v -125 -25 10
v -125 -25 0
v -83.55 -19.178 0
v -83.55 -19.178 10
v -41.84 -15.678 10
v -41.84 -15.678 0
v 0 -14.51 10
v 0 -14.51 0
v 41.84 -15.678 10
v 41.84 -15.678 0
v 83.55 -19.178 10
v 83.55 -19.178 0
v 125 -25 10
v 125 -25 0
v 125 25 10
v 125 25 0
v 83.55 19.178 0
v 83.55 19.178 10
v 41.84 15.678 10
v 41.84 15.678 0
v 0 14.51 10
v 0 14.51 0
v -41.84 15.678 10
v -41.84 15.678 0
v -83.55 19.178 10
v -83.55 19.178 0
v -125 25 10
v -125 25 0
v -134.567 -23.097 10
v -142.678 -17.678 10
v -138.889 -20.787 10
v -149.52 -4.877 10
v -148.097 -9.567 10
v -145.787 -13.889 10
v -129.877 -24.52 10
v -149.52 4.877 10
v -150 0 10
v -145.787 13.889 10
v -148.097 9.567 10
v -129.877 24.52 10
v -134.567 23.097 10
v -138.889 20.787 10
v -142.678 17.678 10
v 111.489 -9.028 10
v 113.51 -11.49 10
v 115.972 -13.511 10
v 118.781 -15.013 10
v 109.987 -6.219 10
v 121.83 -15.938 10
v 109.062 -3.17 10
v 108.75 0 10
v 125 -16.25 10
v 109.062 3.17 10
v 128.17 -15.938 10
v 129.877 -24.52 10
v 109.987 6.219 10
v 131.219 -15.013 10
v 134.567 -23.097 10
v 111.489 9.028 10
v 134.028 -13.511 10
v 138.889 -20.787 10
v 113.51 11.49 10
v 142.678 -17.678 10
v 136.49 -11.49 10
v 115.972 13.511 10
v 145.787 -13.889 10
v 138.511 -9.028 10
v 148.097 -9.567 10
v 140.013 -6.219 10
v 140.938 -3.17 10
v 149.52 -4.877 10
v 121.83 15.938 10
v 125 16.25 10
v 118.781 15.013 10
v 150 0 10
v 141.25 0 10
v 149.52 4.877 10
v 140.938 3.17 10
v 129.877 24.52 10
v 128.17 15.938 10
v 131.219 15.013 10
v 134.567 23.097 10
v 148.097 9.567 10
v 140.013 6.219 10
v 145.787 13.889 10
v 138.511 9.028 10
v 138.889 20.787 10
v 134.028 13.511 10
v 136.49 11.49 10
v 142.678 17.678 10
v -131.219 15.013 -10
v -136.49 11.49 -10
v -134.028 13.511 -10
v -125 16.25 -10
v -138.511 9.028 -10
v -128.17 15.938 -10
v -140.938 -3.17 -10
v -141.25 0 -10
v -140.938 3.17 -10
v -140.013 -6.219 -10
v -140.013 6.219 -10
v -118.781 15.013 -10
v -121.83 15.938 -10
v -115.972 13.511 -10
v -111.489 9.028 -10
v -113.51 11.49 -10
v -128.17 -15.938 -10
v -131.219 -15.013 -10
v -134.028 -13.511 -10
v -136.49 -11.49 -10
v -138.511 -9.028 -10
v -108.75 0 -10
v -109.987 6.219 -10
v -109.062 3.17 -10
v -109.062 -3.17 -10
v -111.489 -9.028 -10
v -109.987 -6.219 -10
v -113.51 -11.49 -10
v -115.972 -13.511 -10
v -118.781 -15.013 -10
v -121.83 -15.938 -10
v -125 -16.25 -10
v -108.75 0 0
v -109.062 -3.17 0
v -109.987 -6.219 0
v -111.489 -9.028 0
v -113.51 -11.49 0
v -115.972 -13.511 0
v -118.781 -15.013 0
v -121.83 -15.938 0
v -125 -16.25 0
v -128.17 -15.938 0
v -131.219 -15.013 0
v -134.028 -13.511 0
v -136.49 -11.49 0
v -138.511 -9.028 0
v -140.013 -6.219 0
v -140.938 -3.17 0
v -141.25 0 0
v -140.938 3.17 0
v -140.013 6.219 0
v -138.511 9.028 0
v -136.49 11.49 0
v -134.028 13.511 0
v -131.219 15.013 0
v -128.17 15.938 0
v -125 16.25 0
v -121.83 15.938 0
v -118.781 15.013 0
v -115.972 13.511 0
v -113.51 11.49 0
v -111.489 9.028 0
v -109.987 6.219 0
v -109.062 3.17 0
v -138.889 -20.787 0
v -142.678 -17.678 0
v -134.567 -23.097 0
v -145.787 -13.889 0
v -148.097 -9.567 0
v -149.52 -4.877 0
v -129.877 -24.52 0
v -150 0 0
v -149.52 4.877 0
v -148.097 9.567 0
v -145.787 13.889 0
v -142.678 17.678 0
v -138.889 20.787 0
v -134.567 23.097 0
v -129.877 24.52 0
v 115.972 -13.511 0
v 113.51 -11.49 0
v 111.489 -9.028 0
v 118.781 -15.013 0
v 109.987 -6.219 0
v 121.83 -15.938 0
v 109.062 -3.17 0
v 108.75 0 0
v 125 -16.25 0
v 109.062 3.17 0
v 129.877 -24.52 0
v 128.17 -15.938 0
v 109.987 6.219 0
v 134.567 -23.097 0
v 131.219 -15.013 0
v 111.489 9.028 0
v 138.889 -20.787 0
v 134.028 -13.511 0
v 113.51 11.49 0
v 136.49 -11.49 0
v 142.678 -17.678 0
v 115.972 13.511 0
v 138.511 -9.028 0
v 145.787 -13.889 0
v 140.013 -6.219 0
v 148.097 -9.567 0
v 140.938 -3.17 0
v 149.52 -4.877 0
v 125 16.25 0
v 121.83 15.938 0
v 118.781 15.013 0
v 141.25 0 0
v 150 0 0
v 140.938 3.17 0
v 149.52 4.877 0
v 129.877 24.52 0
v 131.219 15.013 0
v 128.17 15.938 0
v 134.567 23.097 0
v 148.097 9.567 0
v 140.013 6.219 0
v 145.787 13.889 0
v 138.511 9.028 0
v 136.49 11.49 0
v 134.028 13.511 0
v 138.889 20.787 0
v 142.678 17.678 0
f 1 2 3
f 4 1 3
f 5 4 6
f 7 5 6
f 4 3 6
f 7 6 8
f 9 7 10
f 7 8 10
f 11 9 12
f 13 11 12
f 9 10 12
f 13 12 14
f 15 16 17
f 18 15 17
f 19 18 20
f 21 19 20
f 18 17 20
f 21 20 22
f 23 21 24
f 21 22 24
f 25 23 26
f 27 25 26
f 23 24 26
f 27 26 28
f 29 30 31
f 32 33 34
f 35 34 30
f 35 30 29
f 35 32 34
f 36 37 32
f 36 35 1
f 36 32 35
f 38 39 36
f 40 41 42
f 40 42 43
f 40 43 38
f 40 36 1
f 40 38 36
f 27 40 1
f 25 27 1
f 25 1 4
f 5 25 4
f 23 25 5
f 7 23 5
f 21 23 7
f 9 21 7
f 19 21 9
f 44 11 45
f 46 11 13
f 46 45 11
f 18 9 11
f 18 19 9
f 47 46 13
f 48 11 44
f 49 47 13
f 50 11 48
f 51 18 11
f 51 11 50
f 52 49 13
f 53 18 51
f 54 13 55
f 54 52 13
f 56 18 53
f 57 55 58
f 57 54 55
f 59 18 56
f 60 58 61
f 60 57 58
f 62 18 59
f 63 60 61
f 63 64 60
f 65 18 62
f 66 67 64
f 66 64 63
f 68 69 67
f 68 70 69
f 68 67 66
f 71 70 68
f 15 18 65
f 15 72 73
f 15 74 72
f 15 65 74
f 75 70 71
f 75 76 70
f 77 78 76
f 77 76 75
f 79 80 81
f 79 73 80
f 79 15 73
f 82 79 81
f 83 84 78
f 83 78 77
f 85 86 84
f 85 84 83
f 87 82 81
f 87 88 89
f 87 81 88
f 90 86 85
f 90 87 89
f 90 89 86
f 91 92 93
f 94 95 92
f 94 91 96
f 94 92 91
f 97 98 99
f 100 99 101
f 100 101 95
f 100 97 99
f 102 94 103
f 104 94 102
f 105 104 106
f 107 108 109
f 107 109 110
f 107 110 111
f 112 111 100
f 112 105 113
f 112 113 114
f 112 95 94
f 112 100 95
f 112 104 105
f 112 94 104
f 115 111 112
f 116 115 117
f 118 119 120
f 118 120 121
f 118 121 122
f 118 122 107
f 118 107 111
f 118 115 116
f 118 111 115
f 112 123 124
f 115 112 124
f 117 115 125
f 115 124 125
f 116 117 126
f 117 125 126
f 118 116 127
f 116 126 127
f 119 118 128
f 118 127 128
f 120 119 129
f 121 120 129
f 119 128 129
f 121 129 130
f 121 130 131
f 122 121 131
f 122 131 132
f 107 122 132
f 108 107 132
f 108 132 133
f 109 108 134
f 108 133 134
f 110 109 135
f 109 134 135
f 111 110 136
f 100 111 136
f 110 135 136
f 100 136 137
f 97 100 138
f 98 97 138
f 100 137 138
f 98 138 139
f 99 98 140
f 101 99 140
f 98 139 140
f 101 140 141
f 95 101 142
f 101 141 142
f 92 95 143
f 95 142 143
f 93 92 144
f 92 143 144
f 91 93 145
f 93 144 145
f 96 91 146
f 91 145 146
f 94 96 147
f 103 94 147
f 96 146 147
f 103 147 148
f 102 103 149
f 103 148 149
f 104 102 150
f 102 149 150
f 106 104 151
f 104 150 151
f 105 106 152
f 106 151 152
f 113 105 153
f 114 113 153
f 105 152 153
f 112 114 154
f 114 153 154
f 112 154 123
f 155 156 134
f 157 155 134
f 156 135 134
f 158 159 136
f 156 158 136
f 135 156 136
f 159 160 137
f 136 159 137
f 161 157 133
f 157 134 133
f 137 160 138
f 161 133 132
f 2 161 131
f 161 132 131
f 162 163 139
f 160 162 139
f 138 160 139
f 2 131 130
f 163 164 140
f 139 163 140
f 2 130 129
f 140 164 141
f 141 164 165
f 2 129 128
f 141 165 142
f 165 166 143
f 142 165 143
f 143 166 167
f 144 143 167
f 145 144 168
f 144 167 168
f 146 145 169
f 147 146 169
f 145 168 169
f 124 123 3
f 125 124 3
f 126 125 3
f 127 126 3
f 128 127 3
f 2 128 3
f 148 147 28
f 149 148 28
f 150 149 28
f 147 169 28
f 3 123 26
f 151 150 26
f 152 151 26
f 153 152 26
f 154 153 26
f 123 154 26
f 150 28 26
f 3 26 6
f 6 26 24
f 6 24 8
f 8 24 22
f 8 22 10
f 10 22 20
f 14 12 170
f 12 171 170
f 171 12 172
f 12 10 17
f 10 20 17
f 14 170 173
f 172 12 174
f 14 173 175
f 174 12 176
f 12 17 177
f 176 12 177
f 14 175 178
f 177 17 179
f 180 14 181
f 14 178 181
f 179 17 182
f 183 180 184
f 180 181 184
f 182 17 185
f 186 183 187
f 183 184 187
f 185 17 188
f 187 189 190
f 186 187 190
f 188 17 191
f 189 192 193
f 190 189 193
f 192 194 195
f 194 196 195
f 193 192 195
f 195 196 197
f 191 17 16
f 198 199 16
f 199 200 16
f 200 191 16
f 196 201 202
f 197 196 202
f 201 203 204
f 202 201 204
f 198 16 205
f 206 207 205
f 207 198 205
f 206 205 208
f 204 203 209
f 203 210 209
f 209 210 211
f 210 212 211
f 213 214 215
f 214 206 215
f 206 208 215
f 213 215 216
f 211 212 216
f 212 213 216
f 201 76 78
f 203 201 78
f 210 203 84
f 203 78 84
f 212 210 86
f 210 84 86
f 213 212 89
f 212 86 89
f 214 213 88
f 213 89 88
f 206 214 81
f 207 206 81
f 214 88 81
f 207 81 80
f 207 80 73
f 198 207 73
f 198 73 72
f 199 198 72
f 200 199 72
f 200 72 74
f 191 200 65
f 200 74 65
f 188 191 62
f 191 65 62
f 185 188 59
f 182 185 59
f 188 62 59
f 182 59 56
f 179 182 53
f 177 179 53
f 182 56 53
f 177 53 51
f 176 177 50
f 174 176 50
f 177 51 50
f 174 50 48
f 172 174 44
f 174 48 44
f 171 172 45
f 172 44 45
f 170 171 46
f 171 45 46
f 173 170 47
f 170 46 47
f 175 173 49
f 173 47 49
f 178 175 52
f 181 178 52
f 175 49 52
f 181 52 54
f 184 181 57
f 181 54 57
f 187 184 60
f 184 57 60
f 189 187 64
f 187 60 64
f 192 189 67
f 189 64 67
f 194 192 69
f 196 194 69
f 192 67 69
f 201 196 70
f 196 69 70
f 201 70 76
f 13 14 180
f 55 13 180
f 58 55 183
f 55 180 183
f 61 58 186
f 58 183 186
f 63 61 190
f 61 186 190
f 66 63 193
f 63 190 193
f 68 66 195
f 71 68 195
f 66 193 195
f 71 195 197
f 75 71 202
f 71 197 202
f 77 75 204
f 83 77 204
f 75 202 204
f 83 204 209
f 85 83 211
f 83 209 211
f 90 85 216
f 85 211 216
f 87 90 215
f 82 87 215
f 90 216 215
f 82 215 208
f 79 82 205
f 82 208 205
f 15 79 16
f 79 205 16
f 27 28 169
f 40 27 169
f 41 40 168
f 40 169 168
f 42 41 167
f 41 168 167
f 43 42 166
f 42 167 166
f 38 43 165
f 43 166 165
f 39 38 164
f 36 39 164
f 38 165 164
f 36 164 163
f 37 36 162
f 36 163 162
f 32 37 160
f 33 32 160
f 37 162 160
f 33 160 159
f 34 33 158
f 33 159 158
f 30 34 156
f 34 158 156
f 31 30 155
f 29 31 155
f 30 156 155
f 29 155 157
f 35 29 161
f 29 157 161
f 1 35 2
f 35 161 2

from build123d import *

# Parameters (mm, degrees)
BOSS_EXTRUDE1_DEPTH = 10
SKETCH2_R           = 16.25
BOSS_EXTRUDE2_DEPTH = 10
SKETCH3_R           = 16.25
CUT_EXTRUDE1_DEPTH  = 10


with BuildPart() as part:
    # Sketch1 → Boss-Extrude1 (new body)
    with BuildSketch(Plane.XY):
        with BuildLine():
            ThreePointArc((-125, 25), (-150, 0), (-125, -25))
            ThreePointArc((-125, -25), (0, -14.509972887), (125, -25))
            ThreePointArc((125, -25), (150, 0), (125, 25))
            ThreePointArc((125, 25), (0, 14.509972887), (-125, 25))
        make_face()
    extrude(amount=BOSS_EXTRUDE1_DEPTH)

    # Sketch2 → Boss-Extrude2 (add)
    with BuildSketch(Plane(origin=(0, 0, 0), x_dir=(1, 0, 0), z_dir=(0, 0, -1))):
        with Locations((-125, 0)):
            Circle(SKETCH2_R)
    extrude(amount=BOSS_EXTRUDE2_DEPTH)

    # Sketch3 → Cut-Extrude1 (cut)
    with BuildSketch(Plane.XY.offset(10)):
        with Locations((125, 0)):
            Circle(SKETCH3_R)
    extrude(amount=-CUT_EXTRUDE1_DEPTH, mode=Mode.SUBTRACT)


solid = part.part
